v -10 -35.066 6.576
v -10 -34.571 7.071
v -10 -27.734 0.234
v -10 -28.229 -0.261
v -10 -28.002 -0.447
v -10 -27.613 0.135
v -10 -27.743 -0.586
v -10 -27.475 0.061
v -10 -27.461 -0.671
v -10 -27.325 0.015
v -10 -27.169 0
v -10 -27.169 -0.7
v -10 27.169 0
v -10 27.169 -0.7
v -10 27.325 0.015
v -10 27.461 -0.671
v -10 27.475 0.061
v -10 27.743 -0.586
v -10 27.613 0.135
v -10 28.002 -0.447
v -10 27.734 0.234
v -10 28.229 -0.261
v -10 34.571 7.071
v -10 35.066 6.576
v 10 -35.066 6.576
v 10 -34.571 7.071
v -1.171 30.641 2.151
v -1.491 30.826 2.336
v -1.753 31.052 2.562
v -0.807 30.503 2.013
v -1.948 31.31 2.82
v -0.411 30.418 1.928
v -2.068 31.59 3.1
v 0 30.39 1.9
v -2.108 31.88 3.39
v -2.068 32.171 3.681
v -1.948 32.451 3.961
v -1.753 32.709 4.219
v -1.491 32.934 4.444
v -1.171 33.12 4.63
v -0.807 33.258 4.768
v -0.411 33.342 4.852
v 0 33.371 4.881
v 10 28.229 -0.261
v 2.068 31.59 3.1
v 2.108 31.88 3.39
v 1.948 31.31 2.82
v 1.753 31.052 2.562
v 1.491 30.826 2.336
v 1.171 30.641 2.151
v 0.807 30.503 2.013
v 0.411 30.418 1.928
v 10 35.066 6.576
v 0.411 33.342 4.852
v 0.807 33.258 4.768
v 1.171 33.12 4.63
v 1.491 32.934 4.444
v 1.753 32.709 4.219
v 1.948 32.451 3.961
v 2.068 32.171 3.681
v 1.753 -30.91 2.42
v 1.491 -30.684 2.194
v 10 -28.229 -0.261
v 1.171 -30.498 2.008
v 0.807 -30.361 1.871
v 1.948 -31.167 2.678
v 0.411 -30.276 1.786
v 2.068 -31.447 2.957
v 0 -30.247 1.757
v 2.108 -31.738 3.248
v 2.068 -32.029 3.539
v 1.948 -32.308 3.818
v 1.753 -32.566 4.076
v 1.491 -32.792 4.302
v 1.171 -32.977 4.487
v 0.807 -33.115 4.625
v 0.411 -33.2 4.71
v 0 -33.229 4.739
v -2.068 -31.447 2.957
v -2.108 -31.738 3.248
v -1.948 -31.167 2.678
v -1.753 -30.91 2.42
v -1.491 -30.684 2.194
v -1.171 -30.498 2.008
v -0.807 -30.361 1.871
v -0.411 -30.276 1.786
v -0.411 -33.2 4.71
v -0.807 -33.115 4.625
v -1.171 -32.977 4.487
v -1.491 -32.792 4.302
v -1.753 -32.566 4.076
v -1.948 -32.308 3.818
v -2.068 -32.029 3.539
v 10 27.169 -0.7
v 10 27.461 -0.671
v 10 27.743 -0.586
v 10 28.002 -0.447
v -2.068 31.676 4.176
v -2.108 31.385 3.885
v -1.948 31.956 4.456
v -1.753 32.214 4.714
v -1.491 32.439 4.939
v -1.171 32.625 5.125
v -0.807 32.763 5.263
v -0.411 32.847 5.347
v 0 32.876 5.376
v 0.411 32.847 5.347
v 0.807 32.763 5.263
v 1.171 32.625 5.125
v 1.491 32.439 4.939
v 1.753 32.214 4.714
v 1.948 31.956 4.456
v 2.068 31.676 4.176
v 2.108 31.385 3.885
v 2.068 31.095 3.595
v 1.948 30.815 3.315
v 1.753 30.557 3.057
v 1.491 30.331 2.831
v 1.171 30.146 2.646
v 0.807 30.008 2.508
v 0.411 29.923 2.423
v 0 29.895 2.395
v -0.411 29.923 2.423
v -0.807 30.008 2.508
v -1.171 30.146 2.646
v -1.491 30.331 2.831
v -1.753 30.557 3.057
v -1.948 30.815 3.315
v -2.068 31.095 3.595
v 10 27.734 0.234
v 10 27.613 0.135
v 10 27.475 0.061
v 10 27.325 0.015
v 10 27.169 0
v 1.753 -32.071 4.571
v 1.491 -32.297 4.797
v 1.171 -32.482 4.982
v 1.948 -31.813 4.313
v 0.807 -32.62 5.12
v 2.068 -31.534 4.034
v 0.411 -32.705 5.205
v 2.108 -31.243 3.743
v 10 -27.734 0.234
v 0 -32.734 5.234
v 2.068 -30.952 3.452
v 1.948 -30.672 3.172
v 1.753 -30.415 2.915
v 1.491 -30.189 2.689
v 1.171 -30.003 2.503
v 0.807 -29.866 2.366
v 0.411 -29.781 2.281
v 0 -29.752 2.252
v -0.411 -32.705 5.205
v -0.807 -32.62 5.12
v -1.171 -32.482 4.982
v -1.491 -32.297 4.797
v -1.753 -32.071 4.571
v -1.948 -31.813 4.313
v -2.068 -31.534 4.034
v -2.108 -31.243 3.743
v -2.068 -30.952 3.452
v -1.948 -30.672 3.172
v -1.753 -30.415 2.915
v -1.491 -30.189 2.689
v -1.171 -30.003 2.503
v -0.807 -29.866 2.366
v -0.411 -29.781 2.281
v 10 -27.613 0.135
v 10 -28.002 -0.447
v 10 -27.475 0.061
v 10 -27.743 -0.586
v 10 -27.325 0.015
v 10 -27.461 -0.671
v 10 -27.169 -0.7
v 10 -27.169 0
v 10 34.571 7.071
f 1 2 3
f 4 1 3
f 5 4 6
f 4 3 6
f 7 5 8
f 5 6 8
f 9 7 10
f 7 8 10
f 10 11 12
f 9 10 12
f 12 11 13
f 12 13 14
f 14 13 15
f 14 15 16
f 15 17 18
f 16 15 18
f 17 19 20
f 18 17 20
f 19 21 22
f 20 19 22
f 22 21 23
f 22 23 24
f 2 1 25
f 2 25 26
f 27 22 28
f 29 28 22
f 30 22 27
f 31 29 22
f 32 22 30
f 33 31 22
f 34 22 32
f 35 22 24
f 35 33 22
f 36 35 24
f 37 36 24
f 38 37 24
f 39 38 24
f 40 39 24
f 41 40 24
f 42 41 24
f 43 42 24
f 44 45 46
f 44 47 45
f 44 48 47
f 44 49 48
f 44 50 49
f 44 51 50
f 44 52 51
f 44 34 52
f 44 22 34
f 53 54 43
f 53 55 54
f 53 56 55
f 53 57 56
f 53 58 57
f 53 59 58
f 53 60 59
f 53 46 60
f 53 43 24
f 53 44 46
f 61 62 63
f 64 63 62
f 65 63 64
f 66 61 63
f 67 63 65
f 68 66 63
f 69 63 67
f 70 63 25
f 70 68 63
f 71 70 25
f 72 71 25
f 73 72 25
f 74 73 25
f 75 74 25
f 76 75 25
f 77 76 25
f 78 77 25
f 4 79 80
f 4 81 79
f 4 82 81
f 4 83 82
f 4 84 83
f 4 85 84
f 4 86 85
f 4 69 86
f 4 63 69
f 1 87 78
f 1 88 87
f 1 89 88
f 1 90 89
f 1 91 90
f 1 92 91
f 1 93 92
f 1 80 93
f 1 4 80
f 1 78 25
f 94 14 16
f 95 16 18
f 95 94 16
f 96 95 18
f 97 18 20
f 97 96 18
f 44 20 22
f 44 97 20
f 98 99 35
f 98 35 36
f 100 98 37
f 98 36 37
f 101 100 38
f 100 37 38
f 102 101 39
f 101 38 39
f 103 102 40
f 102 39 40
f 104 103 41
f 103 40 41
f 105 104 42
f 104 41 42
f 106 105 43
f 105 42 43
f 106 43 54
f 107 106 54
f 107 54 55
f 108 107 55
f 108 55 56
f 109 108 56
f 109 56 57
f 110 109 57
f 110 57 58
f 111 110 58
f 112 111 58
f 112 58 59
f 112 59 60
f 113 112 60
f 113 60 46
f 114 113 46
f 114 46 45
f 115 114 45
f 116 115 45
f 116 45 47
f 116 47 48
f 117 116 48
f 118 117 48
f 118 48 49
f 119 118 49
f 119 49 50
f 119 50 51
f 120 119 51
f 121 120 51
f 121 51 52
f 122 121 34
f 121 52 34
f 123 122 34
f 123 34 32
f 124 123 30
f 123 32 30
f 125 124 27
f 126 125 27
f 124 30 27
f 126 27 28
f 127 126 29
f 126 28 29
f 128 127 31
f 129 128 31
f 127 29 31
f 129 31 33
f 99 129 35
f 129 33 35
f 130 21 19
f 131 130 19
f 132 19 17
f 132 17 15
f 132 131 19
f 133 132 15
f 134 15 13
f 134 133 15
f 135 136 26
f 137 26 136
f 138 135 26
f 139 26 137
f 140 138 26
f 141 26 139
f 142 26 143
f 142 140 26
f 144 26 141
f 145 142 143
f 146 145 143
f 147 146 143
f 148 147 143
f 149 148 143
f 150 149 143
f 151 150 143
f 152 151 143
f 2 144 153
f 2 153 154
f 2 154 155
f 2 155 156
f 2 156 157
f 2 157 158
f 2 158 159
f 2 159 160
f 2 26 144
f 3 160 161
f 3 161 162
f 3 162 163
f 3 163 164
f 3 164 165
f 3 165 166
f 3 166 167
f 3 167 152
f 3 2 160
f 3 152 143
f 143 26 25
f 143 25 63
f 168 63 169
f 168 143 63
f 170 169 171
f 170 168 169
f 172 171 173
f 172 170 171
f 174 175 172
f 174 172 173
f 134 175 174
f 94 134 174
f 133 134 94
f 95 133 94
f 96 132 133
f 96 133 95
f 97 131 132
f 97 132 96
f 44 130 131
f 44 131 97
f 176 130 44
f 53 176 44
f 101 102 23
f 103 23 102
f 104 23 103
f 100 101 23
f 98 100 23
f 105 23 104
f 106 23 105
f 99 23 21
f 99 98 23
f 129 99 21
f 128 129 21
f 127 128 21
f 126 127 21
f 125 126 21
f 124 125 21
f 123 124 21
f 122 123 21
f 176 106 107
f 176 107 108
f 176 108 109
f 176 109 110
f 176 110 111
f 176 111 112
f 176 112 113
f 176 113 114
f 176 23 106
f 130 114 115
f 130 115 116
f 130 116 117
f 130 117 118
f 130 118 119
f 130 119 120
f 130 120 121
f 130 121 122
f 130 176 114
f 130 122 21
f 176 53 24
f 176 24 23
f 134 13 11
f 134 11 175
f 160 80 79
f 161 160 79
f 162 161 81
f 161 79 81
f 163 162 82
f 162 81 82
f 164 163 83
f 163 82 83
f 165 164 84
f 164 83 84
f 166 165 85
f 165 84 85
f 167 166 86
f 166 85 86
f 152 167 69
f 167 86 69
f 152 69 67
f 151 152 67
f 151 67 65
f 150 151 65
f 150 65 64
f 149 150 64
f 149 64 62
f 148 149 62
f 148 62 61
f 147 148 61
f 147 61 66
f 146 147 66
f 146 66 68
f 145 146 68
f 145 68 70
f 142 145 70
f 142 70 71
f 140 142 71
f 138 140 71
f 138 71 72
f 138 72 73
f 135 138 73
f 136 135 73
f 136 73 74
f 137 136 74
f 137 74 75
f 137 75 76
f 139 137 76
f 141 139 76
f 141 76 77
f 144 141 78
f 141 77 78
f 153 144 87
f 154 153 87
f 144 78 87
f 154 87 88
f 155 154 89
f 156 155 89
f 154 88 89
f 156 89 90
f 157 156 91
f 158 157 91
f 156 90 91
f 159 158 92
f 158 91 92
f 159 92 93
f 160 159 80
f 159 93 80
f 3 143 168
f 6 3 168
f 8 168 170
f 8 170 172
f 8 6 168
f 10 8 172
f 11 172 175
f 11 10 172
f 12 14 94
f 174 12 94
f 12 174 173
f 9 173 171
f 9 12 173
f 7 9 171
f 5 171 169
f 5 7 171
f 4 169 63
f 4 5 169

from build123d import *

# Parameters (mm, degrees)
SKETCH1_W                    = 20
SKETCH1_H                    = 55
BASE_FLANGE1_DEPTH           = 0.7
EDGE_FLANGE1_STRIP_CUT_DEPTH = 20
EDGE_FLANGE1_DEPTH           = 20
EDGE_FLANGE2_STRIP_CUT_DEPTH = 20
EDGE_FLANGE2_DEPTH           = 20
F_19_0_166_DIAMETER_SLOT1_D  = 4.2164
F_19_0_166_DIAMETER_SLOT2_D  = 4.2164


# Sheet-metal steps are written as plain solids
with BuildPart() as part:
    # Sketch1 → Base-Flange1 (new body)
    with BuildSketch(Plane.XY):
        Rectangle(SKETCH1_W, SKETCH1_H)
    extrude(amount=-BASE_FLANGE1_DEPTH)

    # Edge-Flange1 strip (across the edge) → Edge-Flange1 strip cut (cut)
    with BuildSketch(Plane(origin=(-10, -27.5, 0), x_dir=(0, 0.7071067811865438, 0.7071067811865512), z_dir=(1, 0, 0))):
        Polygon((-3.371930009, 2.381980515), (-0.260660172, -0.729289322), (0.234314575, -0.234314575), (-2.876955262, 2.876955262), align=None)
    extrude(amount=EDGE_FLANGE1_STRIP_CUT_DEPTH, mode=Mode.SUBTRACT)

    # Edge-Flange1 section (across the edge) → Edge-Flange1 (add)
    with BuildSketch(Plane(origin=(-10, -27.5, 0), x_dir=(0, 0.7071067811865438, 0.7071067811865512), z_dir=(1, 0, 0))):
        with BuildLine():
            Line((-0.7, 0.33137085), (-0.7, 10))
            Line((-0.7, 10), (0, 10))
            Line((0, 10), (0, 0.33137085))
            ThreePointArc((0, 0.33137085), (0.060896374, 0.025224104), (0.234314575, -0.234314575))
            Line((0.234314575, -0.234314575), (-0.260660172, -0.729289322))
            ThreePointArc((-0.260660172, -0.729289322), (-0.585819299, -0.242654299), (-0.7, 0.33137085))
        make_face()
    extrude(amount=EDGE_FLANGE1_DEPTH)

    # Edge-Flange2 strip (across the edge) → Edge-Flange2 strip cut (cut)
    with BuildSketch(Plane(origin=(10, 27.5, 0), x_dir=(0, -0.7071067811865438, 0.7071067811865512), z_dir=(-1, 0, 0))):
        Polygon((-3.371930009, 2.381980515), (-0.260660172, -0.729289322), (0.234314575, -0.234314575), (-2.876955262, 2.876955262), align=None)
    extrude(amount=EDGE_FLANGE2_STRIP_CUT_DEPTH, mode=Mode.SUBTRACT)

    # Edge-Flange2 section (across the edge) → Edge-Flange2 (add)
    with BuildSketch(Plane(origin=(10, 27.5, 0), x_dir=(0, -0.7071067811865438, 0.7071067811865512), z_dir=(-1, 0, 0))):
        with BuildLine():
            Line((-0.7, 0.33137085), (-0.7, 10))
            Line((-0.7, 10), (0, 10))
            Line((0, 10), (0, 0.33137085))
            ThreePointArc((0, 0.33137085), (0.060896374, 0.025224104), (0.234314575, -0.234314575))
            Line((0.234314575, -0.234314575), (-0.260660172, -0.729289322))
            ThreePointArc((-0.260660172, -0.729289322), (-0.585819299, -0.242654299), (-0.7, 0.33137085))
        make_face()
    extrude(amount=EDGE_FLANGE2_DEPTH)

    # #19 (0.166) Diameter Slot1 (through all)
    with Locations(Plane(origin=(0, -13.75, -13.75), x_dir=(1, 0, 0), z_dir=(0, 0.7071067811865438, 0.7071067811865513))):
        with Locations((0, -24.738773453)):
            Hole(F_19_0_166_DIAMETER_SLOT1_D / 2)

    # #19 (0.166) Diameter Slot2 (through all)
    with Locations(Plane(origin=(0, 13.75, -13.75), x_dir=(1, 0, 0), z_dir=(0, -0.7071067811865441, 0.7071067811865509))):
        with Locations((0, 24.940163898)):
            Hole(F_19_0_166_DIAMETER_SLOT2_D / 2)


solid = part.part
